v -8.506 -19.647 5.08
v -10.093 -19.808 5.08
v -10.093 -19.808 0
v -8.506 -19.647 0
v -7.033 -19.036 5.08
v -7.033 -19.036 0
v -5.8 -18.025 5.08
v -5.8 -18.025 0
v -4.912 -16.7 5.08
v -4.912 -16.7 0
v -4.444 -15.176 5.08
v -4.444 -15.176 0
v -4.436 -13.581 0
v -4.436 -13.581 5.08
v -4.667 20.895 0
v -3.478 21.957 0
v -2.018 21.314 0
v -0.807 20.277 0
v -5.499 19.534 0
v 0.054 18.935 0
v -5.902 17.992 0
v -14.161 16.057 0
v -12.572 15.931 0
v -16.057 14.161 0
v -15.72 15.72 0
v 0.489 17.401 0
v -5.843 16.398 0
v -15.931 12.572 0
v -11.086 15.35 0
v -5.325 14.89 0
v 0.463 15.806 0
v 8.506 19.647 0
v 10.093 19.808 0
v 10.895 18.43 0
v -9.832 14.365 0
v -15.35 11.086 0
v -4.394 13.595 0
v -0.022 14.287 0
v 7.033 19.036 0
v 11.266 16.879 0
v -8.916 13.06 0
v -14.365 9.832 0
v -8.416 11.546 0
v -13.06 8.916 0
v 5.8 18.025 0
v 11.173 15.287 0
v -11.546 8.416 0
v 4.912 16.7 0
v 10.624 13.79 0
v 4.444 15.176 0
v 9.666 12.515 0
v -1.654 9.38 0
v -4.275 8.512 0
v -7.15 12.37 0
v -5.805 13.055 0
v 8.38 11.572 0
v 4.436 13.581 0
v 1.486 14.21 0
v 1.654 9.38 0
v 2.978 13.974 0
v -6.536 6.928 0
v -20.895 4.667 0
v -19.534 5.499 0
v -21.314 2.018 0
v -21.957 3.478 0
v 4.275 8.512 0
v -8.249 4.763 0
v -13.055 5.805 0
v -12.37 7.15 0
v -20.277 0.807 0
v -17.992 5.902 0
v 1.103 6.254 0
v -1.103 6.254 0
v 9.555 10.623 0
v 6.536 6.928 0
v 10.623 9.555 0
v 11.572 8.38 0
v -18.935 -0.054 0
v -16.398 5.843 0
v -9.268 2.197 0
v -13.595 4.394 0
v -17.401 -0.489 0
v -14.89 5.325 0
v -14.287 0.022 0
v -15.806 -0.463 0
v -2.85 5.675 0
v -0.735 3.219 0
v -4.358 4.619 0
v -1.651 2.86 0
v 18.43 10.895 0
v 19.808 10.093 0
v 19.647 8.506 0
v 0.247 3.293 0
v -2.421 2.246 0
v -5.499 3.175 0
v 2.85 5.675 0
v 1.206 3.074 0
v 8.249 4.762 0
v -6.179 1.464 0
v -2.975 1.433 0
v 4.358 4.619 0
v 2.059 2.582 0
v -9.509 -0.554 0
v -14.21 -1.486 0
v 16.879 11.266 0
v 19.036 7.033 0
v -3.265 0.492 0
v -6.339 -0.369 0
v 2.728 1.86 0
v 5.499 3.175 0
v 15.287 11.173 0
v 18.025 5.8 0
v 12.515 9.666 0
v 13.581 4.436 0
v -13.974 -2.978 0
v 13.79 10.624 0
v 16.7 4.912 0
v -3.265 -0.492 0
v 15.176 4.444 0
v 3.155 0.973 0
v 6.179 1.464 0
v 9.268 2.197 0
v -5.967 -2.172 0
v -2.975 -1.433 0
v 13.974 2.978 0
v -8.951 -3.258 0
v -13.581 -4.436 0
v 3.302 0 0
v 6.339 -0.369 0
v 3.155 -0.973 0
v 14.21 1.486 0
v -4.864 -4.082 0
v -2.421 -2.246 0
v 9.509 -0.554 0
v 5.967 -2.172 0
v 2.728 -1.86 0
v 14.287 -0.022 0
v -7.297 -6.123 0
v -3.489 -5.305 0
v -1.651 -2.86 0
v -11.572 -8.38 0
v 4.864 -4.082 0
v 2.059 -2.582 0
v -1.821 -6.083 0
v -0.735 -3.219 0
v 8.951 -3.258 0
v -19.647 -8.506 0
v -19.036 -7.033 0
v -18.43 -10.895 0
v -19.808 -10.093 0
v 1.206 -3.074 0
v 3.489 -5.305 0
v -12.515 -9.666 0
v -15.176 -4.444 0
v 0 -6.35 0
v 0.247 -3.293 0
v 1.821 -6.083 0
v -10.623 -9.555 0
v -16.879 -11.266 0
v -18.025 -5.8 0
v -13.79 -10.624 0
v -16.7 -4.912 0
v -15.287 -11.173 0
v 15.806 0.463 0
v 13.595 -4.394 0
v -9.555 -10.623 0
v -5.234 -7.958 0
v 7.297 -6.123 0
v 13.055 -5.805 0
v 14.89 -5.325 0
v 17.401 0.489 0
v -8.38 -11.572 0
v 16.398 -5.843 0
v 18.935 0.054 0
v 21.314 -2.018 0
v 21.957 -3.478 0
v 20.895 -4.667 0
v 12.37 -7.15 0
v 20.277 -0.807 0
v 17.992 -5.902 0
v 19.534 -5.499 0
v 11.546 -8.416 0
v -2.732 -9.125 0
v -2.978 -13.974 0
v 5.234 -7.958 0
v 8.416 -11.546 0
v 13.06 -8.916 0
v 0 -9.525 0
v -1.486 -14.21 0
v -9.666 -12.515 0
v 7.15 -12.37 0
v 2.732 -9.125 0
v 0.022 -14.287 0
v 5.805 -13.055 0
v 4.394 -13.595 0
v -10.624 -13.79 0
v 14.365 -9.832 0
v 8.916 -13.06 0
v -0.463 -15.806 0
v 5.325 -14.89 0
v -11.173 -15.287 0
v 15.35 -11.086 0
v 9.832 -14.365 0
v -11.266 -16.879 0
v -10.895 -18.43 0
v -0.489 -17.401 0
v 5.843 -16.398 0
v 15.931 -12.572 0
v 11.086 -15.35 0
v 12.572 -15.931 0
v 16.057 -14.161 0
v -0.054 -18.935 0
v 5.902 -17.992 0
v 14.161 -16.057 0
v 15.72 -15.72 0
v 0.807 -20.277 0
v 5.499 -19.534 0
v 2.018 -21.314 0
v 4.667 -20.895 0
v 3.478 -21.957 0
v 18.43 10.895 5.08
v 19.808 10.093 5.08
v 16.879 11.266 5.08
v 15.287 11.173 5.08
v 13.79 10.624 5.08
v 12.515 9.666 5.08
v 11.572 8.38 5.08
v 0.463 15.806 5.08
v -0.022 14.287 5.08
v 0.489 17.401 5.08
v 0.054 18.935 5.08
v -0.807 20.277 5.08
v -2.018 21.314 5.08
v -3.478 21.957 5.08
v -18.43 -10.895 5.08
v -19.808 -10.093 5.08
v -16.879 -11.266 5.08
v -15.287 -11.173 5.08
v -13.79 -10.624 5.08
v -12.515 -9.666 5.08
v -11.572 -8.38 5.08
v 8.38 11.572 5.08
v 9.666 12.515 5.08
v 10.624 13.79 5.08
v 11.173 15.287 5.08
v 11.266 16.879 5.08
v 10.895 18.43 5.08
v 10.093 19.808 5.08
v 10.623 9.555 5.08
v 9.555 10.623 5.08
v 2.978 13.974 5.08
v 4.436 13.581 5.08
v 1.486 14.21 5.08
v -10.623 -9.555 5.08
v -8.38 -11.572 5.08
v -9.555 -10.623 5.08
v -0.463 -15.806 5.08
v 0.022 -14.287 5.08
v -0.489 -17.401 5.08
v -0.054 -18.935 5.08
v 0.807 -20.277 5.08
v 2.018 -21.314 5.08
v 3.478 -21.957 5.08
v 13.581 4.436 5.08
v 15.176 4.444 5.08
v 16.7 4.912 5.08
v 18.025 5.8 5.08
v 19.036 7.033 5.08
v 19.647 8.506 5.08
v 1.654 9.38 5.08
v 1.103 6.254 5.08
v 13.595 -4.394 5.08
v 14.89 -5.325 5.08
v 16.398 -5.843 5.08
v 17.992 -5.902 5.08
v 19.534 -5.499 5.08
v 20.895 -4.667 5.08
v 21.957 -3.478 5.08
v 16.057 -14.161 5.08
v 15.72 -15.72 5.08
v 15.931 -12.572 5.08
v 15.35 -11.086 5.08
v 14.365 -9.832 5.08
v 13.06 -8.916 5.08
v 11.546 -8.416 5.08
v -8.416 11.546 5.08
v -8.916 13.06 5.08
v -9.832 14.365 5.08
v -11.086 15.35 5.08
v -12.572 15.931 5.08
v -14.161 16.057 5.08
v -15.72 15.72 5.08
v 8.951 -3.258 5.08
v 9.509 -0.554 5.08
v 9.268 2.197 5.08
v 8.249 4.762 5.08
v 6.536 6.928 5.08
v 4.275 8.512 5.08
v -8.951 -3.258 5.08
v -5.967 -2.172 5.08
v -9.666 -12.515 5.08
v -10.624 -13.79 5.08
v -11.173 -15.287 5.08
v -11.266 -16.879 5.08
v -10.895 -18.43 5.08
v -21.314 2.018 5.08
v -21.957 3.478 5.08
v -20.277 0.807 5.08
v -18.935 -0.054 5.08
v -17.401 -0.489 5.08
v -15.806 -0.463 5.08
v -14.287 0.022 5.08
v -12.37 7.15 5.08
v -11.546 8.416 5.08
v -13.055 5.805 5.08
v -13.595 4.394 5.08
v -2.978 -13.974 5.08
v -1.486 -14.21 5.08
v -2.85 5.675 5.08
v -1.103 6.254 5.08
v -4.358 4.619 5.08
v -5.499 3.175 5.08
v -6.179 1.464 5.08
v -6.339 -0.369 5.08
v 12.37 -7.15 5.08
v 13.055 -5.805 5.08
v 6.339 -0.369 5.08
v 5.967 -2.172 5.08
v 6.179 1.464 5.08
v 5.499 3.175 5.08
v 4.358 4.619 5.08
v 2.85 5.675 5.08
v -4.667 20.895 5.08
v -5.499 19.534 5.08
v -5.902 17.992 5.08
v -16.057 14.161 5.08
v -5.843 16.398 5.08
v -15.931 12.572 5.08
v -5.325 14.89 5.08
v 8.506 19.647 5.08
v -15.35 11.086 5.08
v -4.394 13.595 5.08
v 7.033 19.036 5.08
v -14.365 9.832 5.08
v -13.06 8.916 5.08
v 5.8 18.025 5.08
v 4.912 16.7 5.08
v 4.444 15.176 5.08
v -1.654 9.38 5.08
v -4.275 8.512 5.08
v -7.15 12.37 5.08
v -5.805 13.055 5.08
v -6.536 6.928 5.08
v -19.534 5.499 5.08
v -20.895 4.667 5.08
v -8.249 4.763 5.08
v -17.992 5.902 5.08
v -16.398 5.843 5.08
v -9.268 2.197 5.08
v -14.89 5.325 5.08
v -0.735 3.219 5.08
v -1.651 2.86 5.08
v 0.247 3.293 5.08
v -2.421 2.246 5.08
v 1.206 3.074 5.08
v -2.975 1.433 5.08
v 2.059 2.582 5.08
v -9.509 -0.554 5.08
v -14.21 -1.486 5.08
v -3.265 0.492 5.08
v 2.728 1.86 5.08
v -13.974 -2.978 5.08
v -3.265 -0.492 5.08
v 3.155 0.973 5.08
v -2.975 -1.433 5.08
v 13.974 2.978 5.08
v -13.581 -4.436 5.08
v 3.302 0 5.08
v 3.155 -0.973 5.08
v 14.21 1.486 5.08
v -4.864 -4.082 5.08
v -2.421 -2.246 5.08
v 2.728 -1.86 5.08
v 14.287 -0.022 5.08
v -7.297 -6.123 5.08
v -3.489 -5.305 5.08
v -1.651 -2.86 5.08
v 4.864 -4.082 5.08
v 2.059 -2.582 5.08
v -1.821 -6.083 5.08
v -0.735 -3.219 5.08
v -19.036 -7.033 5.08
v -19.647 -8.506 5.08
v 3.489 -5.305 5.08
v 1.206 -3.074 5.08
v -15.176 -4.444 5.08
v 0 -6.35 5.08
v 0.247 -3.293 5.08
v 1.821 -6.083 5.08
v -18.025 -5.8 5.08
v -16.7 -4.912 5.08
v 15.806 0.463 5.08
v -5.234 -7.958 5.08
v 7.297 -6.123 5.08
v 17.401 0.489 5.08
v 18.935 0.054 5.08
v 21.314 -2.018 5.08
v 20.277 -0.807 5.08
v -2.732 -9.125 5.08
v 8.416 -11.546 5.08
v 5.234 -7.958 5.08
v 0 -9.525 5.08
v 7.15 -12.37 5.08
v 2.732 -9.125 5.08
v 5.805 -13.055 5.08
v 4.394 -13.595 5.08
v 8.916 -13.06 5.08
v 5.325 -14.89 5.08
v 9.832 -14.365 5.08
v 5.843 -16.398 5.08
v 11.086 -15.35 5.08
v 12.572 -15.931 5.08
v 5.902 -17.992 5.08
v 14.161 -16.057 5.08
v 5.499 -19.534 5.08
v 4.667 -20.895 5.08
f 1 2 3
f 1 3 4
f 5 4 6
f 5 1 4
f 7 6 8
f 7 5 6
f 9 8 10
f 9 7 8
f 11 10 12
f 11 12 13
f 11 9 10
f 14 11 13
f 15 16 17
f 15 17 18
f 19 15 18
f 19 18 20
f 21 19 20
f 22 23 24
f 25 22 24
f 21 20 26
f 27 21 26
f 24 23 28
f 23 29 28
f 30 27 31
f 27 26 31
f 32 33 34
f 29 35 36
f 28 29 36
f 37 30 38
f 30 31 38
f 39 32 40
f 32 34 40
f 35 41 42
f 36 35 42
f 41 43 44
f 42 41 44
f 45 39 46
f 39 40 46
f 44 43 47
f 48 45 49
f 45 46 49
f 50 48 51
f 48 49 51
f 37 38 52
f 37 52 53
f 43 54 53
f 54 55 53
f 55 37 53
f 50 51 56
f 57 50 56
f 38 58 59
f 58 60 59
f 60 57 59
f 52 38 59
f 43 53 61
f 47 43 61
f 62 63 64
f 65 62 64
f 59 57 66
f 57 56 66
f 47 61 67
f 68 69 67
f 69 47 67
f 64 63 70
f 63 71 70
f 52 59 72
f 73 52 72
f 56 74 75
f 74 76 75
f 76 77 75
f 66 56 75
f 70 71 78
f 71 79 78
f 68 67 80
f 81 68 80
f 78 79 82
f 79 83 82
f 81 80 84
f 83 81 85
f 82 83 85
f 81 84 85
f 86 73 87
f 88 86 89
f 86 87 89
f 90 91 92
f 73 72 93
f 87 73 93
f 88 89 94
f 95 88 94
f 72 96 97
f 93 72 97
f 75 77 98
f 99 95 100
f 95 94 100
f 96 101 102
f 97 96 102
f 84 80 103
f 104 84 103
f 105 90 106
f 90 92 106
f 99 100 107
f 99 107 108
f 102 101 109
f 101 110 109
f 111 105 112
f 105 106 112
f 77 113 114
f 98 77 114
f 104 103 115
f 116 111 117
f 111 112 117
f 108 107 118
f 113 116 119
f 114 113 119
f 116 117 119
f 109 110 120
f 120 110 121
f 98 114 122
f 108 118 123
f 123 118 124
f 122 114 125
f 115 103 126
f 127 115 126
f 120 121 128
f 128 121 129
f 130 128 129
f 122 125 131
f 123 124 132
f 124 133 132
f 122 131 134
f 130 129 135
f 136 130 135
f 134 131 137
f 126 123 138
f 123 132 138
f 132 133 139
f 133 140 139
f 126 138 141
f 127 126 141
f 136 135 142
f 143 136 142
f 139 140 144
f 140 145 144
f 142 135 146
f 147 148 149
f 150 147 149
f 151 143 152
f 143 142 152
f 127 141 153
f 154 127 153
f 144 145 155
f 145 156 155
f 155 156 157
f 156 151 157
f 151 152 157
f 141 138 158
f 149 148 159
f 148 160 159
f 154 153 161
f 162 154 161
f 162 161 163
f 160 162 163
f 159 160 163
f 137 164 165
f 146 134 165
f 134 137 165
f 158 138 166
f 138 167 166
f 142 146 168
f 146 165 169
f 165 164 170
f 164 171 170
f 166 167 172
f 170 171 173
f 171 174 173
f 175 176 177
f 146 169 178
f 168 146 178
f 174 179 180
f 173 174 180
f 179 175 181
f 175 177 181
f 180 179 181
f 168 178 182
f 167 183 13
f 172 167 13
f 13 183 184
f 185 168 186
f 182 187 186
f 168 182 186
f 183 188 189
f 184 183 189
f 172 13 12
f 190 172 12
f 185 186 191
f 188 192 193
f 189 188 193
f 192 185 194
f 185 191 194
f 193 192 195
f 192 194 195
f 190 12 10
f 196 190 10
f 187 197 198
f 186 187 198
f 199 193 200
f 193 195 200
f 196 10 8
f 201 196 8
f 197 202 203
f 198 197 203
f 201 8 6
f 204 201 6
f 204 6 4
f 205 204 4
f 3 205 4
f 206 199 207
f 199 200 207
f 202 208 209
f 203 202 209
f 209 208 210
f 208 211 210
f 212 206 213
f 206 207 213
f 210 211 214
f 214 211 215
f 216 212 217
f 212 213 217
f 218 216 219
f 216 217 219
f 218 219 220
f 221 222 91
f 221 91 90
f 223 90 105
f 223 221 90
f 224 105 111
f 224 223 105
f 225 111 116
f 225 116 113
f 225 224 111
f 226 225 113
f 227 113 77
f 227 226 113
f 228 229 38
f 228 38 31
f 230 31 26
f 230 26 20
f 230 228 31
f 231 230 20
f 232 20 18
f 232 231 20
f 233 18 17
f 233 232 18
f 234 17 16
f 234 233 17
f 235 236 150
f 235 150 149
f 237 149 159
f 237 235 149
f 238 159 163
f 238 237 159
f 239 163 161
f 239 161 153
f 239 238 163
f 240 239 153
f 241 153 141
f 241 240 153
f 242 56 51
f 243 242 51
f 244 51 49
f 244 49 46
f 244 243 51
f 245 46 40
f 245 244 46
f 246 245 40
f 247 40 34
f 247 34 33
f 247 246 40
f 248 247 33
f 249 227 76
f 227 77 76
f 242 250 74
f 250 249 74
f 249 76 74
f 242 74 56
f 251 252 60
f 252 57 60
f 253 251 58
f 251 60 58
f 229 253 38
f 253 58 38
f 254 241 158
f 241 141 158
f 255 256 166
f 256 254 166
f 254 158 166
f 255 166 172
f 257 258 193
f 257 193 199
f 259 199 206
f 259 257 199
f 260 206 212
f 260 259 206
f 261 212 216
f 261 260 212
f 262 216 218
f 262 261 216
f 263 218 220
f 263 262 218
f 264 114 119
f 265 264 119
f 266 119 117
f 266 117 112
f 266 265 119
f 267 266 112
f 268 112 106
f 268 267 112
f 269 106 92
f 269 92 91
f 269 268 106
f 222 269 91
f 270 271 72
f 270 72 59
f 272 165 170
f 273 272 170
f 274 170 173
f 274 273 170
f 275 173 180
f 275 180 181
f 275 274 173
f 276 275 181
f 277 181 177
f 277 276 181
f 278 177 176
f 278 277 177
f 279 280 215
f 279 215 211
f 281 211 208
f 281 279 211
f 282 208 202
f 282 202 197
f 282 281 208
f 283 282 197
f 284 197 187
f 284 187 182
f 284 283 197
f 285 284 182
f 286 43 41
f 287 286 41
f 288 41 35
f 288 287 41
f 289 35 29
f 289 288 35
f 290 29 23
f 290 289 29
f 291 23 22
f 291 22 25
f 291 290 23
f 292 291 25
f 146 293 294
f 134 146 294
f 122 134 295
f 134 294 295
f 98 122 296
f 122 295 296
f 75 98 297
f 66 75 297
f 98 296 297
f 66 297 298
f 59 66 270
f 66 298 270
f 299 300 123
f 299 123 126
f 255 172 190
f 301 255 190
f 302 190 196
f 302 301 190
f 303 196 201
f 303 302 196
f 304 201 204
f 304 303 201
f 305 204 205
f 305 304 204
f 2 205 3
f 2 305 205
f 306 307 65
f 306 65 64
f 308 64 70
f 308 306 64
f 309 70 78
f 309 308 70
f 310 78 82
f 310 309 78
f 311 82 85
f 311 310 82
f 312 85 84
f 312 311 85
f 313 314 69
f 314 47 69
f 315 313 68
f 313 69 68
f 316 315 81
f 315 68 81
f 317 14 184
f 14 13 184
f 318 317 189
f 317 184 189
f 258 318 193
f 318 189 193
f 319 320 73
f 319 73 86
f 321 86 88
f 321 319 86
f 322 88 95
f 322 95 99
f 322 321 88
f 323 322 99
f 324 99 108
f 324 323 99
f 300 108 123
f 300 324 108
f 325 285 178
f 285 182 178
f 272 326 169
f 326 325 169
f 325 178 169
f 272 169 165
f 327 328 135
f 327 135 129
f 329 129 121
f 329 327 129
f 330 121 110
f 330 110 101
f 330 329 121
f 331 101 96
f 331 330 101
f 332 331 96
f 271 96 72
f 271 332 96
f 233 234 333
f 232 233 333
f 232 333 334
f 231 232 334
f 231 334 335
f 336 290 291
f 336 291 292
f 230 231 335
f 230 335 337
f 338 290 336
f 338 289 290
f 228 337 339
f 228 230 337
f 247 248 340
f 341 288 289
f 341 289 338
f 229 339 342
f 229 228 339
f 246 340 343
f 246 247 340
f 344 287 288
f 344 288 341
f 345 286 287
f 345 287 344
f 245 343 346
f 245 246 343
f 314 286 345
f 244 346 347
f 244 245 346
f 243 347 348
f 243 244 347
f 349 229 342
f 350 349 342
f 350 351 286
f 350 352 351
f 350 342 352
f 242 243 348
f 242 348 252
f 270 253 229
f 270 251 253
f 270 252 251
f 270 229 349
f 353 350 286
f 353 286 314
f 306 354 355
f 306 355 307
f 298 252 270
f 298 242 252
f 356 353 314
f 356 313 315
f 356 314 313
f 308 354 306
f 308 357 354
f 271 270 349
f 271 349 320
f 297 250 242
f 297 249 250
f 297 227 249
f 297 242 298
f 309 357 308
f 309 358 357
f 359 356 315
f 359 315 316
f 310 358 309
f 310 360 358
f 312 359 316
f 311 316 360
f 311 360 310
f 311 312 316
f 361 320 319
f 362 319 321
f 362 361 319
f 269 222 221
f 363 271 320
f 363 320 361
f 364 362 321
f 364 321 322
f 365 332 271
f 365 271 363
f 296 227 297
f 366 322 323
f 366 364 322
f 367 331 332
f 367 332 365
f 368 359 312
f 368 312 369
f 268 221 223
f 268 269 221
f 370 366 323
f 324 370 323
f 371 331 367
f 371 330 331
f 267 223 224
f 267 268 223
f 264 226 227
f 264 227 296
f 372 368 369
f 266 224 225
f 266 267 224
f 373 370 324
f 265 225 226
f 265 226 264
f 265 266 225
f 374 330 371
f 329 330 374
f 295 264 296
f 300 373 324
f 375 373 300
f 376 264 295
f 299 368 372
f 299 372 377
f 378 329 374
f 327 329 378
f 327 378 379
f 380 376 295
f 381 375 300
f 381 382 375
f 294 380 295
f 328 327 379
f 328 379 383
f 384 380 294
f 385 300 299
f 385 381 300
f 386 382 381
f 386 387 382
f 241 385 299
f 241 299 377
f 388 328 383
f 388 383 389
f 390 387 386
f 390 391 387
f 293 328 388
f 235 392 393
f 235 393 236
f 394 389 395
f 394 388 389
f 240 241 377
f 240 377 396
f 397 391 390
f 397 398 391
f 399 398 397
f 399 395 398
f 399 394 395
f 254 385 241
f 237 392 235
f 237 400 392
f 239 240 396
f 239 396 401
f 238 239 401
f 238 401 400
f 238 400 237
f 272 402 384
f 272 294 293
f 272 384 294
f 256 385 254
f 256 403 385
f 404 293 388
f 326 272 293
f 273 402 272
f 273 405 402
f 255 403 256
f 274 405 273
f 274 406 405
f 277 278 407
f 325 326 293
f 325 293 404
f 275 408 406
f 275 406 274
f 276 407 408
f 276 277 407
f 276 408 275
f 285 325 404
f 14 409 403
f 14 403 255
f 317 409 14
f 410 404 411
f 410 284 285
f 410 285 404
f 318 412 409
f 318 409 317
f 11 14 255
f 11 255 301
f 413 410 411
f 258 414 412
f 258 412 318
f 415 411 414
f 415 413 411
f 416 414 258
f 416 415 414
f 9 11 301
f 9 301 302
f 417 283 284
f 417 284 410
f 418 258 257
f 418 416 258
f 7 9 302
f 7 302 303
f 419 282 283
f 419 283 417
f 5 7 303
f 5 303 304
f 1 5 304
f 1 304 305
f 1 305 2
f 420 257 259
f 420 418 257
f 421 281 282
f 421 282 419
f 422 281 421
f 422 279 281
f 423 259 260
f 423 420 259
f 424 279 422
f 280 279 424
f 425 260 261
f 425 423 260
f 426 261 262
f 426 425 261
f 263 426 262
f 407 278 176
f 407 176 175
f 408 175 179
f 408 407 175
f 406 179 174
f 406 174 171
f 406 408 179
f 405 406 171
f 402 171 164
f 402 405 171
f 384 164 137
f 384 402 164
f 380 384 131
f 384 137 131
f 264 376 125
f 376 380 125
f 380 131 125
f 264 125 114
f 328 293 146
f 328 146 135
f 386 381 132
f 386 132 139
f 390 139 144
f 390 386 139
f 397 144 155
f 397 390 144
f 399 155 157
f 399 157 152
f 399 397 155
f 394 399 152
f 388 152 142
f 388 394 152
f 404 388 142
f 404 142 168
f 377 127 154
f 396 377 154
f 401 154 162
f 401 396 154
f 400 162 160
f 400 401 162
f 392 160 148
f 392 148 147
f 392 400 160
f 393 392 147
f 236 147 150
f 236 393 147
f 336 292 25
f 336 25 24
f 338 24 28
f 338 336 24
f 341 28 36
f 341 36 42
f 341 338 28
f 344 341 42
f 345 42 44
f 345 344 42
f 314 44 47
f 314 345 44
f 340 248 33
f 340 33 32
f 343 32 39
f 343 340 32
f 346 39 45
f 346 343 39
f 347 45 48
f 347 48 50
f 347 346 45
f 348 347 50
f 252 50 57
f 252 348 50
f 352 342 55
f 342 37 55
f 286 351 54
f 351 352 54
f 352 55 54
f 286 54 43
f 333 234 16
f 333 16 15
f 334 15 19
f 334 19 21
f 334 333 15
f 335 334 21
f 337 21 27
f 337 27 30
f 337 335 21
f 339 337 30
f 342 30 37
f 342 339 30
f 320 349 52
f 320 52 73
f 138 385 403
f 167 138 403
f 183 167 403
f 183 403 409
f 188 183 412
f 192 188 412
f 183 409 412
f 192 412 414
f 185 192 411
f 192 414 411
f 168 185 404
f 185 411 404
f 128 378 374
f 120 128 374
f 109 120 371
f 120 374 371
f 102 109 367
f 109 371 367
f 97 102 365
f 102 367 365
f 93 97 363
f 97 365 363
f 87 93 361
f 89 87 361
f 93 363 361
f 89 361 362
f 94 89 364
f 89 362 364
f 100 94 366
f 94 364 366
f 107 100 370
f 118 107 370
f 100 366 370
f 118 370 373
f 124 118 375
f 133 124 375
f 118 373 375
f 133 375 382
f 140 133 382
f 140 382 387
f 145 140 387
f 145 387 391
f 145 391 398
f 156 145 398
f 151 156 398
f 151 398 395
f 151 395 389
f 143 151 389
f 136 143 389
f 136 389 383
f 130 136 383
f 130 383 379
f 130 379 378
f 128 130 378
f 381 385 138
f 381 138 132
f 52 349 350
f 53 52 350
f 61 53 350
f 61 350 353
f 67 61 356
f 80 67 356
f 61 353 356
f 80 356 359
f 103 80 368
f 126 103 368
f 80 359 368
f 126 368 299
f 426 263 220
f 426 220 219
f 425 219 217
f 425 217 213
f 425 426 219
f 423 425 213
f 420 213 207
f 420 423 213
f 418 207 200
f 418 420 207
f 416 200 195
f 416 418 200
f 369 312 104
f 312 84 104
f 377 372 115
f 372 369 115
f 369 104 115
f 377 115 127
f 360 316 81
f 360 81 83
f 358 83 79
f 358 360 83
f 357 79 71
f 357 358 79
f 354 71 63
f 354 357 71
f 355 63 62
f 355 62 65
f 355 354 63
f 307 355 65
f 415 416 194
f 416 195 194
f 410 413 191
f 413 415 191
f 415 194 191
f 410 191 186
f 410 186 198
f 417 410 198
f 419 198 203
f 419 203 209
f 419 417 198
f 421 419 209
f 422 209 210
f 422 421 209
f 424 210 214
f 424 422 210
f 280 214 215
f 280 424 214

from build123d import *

# Parameters (mm, degrees)
F0_R      = 14.2875
F1_DEPTH  = 5.08
F3_DEPTH  = 5.08
F4_COUNT  = 10
F5_R      = 9.525
F6_DEPTH  = 5.081
F7_DEPTH  = 5.081
F9_DEPTH  = 5.08
F10_COUNT = 3
F11_R     = 3.302
F12_DEPTH = 5.081


with BuildPart() as f1:
    # F0 (on Top) → F1 (new body)
    with BuildSketch(Plane.XY):
        Circle(F0_R)
    extrude(amount=F1_DEPTH)

    # F4: F3 ×10 about axis
    f4_axis = Axis((0, 0, 5.08), (0, 0, 1))


with BuildPart() as f3:
    # F2 (on face) → F3 (new body, through all)
    with BuildSketch(Plane.XY.offset(5.08)):
        with BuildLine():
            Line((-4.393811939, 13.5947116911), (-0.0222334703, 14.2871017002))
            ThreePointArc((-0.0222334703, 14.2871017002), (0.0536070974, 18.934616917), (-3.4776602758, 21.957082834))
            ThreePointArc((-3.4776602758, 21.957082834), (-5.9021017886, 17.9913252983), (-4.393811939, 13.5947116911))
        make_face()
    extrude(amount=-F3_DEPTH)


with BuildPart() as f1_1:
    add(f1.part)
    for i in range(1, F4_COUNT):
        add(f3.part.rotate(f4_axis, i * 360 / F4_COUNT))

    # F5 (on face) → F6 (cut, through all)
    with BuildSketch(Plane.XY.offset(5.08)):
        Circle(F5_R)
    extrude(amount=-F6_DEPTH, mode=Mode.SUBTRACT)

    # F5 (on face) → F7 (cut, through all)
    with BuildSketch(Plane.XY.offset(5.08)):
        Circle(F5_R)
    extrude(amount=-F7_DEPTH, mode=Mode.SUBTRACT)



with BuildPart() as f9:
    # F8 (on face) → F9 (new body, through all)
    with BuildSketch(Plane.XY.offset(5.08)):
        with BuildLine():
            Line((-1.6539988923, 9.3802938474), (-1.1026659282, 6.2535292316))
            ThreePointArc((-1.1026659282, 6.2535292316), (0, -6.35), (1.1026659282, 6.2535292316))
            Line((1.1026659282, 6.2535292316), (1.6539988923, 9.3802938474))
            ThreePointArc((1.6539988923, 9.3802938474), (0, 9.525), (-1.6539988923, 9.3802938474))
        make_face()
    extrude(amount=-F9_DEPTH)


with BuildPart() as f1_2:
    add(f1_1.part)

    add(f3.part)  # F10 merges F3

    add(f9.part)  # F10 merges F9
    # F10: F9 ×3 about axis
    f10_axis = Axis((0, 0, 5.08), (0, 0, 1))
    for i in range(1, F10_COUNT):
        add(f9.part.rotate(f10_axis, i * 360 / F10_COUNT))

    # F11 (on face) → F12 (cut, through all)
    with BuildSketch(Plane.XY.offset(5.08)):
        Circle(F11_R)
    extrude(amount=-F12_DEPTH, mode=Mode.SUBTRACT)


solid = f1_2.part
